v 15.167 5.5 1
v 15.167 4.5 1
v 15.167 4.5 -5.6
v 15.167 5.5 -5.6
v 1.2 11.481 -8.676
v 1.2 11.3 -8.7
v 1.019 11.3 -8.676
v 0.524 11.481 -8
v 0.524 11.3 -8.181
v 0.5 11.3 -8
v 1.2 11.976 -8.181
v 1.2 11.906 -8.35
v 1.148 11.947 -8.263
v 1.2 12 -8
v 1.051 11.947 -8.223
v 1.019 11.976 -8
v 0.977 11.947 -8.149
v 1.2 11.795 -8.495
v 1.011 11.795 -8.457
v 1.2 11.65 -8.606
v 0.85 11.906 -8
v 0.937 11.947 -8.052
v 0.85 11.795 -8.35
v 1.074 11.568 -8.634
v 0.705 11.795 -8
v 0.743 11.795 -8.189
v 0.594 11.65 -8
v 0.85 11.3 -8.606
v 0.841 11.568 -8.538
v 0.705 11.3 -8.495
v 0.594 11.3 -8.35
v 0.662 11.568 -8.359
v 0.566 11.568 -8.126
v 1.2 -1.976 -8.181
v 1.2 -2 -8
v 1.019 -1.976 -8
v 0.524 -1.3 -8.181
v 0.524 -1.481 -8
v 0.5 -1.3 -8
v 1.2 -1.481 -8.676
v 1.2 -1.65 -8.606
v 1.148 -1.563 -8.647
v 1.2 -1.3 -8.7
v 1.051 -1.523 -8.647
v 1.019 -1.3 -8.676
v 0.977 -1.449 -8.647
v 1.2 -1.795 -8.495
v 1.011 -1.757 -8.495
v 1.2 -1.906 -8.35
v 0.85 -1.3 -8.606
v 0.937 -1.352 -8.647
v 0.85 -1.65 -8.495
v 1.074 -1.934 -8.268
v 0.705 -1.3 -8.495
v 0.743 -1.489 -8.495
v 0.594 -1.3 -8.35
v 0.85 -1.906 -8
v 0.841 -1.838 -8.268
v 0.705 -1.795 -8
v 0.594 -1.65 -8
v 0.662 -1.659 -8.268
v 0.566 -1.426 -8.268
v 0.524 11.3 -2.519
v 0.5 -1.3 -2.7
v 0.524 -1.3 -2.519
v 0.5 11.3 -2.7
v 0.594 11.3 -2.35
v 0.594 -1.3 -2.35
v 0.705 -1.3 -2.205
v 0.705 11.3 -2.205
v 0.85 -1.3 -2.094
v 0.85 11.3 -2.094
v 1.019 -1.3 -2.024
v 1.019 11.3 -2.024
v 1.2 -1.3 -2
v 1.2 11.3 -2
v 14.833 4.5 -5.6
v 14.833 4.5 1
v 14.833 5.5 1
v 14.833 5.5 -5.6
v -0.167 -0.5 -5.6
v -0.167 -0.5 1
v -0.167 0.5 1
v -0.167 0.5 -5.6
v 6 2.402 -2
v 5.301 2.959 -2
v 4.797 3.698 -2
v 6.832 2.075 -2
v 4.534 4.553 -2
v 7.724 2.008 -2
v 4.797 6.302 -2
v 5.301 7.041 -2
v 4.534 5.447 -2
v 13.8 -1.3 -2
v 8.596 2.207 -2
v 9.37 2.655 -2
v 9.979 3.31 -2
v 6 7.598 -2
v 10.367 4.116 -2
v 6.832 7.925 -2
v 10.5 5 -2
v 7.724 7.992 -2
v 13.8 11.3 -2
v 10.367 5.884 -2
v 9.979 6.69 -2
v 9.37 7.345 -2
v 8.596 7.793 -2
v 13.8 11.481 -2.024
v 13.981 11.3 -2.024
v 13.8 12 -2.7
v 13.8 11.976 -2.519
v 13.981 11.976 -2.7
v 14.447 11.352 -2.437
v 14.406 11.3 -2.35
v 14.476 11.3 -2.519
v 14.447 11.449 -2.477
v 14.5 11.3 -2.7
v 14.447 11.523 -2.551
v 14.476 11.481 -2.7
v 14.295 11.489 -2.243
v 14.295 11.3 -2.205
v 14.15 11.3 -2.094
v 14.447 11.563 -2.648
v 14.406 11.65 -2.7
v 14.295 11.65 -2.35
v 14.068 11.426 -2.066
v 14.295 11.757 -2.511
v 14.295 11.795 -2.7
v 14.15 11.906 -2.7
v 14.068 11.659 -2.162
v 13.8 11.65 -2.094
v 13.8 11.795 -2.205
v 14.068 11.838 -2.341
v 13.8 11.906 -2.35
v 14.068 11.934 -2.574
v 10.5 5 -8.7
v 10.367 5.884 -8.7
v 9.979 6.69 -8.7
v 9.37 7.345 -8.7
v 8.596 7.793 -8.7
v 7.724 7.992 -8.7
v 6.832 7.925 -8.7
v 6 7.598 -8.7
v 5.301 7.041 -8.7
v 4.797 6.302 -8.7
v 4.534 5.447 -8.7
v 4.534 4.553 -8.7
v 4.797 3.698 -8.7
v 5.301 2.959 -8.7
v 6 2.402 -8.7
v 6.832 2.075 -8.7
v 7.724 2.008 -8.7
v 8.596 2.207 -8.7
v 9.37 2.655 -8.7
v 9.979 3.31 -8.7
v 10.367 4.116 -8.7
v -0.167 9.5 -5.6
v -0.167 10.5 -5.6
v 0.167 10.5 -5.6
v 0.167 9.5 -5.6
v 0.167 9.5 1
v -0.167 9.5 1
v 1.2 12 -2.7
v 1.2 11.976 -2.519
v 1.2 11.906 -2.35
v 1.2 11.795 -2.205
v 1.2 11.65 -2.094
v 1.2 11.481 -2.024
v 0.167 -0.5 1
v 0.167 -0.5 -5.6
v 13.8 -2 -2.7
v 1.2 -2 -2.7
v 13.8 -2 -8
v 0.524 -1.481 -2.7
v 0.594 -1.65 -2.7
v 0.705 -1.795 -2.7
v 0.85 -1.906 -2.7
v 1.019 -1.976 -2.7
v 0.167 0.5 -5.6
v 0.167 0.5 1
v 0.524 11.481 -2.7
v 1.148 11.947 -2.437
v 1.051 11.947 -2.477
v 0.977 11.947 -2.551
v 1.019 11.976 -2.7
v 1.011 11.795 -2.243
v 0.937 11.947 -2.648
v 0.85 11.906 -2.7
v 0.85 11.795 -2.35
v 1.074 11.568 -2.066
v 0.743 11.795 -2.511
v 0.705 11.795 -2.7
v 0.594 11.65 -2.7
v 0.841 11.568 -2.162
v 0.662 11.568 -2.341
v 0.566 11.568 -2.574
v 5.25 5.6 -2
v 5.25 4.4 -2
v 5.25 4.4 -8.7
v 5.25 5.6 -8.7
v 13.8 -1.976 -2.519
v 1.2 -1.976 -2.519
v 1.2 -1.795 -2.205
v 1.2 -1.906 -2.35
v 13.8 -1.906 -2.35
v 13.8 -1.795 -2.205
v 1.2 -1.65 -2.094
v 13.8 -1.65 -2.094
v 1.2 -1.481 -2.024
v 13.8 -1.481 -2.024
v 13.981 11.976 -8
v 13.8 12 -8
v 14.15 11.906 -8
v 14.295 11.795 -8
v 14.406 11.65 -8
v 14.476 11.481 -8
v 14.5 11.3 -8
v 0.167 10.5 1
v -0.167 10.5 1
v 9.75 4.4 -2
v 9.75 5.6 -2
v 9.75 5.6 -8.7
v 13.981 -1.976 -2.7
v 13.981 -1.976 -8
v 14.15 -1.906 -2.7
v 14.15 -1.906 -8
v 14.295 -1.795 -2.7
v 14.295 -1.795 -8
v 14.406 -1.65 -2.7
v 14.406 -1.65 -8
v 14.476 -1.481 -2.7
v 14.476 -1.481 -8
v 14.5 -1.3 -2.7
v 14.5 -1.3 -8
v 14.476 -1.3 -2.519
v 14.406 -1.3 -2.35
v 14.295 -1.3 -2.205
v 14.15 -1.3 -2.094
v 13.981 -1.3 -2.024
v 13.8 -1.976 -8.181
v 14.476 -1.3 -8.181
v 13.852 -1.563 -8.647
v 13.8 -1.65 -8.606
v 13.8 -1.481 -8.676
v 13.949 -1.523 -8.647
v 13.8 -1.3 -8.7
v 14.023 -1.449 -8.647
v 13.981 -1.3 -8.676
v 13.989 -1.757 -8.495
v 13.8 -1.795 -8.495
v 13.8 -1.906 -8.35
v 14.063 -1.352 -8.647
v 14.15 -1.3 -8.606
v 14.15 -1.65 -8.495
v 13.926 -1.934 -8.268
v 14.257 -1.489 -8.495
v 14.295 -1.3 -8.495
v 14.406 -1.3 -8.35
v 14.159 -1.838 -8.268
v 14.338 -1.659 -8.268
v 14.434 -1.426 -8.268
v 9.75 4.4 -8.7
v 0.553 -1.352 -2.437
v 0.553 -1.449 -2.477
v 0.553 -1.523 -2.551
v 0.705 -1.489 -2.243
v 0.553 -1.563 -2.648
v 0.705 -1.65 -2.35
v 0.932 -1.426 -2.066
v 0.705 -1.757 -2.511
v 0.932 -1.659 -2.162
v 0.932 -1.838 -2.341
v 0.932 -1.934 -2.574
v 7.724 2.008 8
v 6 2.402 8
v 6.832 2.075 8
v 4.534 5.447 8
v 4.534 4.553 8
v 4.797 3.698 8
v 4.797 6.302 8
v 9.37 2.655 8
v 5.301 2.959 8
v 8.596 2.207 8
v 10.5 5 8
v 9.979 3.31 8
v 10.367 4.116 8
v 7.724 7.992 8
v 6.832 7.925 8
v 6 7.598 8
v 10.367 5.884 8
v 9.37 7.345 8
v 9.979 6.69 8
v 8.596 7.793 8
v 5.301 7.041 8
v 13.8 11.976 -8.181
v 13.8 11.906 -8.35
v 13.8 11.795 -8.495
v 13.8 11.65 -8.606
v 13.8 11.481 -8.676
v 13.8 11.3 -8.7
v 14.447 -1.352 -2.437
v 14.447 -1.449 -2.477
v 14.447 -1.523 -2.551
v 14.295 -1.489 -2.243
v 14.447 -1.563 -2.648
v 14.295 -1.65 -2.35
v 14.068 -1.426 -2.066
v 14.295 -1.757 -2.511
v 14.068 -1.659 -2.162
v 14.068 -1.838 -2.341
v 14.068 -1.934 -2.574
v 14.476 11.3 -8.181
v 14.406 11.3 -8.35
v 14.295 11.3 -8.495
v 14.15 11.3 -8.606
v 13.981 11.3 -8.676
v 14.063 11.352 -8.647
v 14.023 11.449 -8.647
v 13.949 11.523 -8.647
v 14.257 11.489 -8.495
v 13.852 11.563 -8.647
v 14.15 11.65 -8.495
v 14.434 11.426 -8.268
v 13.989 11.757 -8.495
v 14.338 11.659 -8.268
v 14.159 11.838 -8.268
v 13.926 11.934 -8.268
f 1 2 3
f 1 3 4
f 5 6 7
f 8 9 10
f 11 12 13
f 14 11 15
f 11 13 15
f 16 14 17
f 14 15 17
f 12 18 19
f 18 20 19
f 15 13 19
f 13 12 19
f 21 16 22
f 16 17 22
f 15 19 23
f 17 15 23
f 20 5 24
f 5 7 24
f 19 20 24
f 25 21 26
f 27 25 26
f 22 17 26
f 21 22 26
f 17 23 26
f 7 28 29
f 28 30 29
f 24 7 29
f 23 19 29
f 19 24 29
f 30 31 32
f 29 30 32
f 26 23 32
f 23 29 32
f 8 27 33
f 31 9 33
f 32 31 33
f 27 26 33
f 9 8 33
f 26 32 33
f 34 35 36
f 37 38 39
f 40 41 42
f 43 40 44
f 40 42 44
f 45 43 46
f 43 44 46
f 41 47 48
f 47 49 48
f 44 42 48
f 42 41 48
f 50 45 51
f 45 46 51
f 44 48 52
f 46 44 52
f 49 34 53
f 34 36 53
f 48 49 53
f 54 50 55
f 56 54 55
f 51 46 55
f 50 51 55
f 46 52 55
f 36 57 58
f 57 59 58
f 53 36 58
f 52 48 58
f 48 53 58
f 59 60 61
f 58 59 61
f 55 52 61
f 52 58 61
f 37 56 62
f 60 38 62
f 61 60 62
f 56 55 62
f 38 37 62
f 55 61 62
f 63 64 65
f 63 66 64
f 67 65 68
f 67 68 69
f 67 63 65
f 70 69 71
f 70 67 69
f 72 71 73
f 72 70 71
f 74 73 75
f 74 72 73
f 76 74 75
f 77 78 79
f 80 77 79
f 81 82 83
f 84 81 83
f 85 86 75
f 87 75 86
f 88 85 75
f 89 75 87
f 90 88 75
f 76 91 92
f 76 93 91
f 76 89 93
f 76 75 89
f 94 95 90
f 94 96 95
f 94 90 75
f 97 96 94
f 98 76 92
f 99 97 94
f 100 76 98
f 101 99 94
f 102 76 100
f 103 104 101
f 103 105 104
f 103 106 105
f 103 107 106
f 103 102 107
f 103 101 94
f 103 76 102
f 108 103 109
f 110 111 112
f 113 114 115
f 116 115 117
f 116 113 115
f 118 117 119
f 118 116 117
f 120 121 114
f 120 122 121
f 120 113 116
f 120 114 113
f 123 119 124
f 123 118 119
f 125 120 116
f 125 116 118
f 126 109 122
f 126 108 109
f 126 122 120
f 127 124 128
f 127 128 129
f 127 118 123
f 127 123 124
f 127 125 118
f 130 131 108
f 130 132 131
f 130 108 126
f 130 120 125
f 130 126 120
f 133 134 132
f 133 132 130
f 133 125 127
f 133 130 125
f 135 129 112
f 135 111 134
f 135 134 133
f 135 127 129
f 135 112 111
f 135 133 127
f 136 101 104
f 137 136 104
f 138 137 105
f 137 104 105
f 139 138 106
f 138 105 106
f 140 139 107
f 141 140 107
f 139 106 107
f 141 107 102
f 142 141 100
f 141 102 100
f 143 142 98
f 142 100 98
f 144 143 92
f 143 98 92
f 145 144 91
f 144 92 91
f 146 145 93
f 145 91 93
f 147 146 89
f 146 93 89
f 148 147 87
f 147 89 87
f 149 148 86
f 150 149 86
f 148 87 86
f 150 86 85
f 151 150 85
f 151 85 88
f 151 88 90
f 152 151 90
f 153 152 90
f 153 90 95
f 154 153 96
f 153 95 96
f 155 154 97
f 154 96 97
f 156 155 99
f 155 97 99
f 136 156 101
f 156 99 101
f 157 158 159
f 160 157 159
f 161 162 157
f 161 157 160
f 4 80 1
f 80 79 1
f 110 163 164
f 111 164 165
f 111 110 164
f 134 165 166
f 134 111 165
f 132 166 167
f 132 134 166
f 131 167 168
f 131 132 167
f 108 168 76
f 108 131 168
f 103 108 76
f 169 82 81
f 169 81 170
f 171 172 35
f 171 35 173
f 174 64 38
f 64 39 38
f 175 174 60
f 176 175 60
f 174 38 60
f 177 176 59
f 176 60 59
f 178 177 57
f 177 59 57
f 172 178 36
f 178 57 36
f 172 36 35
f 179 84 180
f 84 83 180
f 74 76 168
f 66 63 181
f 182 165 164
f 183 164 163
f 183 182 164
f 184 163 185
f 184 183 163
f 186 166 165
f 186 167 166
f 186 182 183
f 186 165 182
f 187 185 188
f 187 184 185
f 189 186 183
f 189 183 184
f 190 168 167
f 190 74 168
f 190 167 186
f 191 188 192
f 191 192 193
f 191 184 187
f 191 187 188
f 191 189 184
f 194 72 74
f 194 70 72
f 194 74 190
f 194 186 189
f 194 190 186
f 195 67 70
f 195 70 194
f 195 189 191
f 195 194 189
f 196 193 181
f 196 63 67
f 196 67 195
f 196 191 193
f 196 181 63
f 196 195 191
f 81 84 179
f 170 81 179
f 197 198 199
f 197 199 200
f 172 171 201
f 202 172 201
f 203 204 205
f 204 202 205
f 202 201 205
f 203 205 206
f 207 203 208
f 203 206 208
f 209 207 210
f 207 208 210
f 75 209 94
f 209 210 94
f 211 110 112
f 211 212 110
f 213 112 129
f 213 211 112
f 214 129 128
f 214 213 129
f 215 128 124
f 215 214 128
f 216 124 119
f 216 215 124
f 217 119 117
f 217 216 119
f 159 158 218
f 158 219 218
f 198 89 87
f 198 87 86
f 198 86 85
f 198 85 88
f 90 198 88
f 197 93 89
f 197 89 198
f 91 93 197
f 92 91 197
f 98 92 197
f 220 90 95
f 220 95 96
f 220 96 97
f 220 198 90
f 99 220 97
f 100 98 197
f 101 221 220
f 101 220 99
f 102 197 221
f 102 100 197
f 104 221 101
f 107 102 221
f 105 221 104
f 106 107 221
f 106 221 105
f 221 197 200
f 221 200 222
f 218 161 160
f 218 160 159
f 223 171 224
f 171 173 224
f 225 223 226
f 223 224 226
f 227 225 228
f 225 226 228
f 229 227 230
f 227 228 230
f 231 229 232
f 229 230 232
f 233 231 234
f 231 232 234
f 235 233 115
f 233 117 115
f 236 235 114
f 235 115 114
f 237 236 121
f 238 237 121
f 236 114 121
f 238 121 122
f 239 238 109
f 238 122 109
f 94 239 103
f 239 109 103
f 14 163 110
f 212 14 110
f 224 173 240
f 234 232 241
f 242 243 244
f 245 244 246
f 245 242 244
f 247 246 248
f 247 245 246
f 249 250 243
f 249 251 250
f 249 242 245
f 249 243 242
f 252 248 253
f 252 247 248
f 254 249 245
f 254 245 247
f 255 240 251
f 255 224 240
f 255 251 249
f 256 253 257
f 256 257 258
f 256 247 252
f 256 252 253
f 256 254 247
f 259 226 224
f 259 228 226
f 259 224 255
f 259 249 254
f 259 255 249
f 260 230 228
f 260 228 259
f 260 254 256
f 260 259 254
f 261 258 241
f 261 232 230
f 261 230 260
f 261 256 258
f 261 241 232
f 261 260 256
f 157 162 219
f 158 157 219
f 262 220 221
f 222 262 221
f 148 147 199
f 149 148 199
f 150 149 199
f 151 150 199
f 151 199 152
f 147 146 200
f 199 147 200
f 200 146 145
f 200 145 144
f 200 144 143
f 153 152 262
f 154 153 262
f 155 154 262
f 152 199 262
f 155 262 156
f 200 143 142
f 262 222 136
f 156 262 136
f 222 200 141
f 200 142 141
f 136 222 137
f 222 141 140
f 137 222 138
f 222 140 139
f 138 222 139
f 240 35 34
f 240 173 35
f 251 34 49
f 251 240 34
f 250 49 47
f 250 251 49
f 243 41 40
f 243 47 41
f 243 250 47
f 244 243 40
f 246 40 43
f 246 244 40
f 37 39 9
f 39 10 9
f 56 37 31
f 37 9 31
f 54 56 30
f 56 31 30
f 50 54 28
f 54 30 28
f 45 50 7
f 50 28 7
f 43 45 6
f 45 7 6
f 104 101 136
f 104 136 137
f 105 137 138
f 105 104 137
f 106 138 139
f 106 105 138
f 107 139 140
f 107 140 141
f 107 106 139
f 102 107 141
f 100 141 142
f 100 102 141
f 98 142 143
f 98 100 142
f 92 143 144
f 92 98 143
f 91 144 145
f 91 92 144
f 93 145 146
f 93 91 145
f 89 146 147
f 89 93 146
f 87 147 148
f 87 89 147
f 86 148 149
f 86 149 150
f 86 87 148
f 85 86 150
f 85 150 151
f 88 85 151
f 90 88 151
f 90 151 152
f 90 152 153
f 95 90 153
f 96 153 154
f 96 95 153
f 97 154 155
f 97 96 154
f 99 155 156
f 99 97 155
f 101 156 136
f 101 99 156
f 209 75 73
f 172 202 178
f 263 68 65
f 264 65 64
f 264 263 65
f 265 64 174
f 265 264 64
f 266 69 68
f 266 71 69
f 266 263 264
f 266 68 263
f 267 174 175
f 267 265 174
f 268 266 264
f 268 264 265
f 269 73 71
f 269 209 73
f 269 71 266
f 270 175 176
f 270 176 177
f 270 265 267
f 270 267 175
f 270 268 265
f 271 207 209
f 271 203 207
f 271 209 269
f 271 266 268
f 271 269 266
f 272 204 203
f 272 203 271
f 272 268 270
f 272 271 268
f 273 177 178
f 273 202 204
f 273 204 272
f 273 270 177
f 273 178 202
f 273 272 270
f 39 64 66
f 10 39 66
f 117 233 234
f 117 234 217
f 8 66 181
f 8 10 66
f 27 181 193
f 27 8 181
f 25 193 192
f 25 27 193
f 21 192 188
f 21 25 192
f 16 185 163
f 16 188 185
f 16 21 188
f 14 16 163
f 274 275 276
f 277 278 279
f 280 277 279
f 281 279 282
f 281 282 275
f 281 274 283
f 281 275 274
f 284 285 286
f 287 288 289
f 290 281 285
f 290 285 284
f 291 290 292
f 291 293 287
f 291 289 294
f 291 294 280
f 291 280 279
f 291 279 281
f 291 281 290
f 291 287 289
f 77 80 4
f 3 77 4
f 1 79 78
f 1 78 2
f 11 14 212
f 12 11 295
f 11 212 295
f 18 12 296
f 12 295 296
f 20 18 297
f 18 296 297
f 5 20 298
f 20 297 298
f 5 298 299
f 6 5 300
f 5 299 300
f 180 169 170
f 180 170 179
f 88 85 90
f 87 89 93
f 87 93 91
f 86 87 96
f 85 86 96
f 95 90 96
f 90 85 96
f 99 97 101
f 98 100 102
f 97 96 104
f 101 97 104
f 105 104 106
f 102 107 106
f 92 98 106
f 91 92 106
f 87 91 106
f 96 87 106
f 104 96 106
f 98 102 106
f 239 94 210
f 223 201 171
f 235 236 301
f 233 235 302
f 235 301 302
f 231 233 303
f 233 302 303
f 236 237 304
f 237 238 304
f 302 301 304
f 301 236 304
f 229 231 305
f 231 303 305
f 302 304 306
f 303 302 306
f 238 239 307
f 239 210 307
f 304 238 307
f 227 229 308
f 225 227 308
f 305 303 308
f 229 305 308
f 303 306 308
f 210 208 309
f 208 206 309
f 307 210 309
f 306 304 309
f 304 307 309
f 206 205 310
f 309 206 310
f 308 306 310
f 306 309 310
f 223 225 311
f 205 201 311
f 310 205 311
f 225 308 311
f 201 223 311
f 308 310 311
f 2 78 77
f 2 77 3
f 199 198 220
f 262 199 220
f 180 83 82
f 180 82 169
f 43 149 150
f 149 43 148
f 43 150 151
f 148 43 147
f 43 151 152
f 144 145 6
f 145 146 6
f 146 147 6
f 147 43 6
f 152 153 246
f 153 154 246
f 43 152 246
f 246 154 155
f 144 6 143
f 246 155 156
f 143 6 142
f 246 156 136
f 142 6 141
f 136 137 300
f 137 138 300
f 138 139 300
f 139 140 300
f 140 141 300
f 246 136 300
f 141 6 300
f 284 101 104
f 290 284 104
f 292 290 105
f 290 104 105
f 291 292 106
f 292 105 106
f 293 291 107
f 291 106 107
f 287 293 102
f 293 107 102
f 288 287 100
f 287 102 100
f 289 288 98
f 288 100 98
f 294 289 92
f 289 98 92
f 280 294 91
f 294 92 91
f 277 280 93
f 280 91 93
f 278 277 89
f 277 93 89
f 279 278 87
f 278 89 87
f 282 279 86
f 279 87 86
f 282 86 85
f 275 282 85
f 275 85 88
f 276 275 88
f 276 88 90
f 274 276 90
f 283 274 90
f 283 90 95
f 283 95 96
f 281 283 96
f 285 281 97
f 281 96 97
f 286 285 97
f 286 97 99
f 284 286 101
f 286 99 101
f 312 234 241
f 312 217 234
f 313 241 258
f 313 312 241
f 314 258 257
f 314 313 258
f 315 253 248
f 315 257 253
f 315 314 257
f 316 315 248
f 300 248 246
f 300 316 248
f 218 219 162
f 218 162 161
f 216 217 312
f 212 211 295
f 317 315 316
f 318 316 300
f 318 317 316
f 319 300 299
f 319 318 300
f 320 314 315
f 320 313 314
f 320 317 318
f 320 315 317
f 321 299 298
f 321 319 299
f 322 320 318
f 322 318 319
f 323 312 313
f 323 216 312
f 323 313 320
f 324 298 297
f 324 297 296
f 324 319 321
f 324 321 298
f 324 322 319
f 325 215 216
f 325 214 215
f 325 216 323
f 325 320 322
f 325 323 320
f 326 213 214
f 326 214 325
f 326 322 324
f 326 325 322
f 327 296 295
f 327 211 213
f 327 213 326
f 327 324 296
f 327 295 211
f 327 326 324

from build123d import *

# Parameters (mm, degrees)
SKETCH003_W       = 0.333334
SKETCH003_H       = 1
PAD002_DEPTH      = 1
PAD002_DEPTH_BACK = 5.6
SKETCH004_R       = 3
SKETCH004_W       = 4.5
SKETCH004_H       = 1.2
PAD003_DEPTH      = 6.7
SKETCH006_R       = 3
PAD005_DEPTH      = 10
SKETCH_W          = 14
SKETCH_H          = 14
SKETCH_R          = 3
PAD_DEPTH         = 6.7
FILLET_R          = 0.7


with BuildPart() as pad002:
    # Sketch003 → Pad002 (new body, two sides)
    with BuildSketch(Plane(origin=(0, 10, 0), x_dir=(1, 0, 0), z_dir=(0, 0, 1))) as pad002_sk:
        Rectangle(SKETCH003_W, SKETCH003_H)
        with Locations((15, -5)):
            Rectangle(SKETCH003_W, SKETCH003_H)
        with Locations((0, -10)):
            Rectangle(SKETCH003_W, SKETCH003_H)
    extrude(amount=PAD002_DEPTH)
    extrude(pad002_sk.sketch, amount=-PAD002_DEPTH_BACK)


with BuildPart() as pad003:
    # Sketch004 → Pad003 (new body)
    with BuildSketch(Plane(origin=(0, 10, -2), x_dir=(1, 0, 0), z_dir=(0, 0, 1))):
        with Locations((7.5, -5)):
            Circle(SKETCH004_R)
        with Locations((7.5, -5)):
            Rectangle(SKETCH004_W, SKETCH004_H, mode=Mode.SUBTRACT)
    extrude(amount=-PAD003_DEPTH)


with BuildPart() as pad005:
    # Sketch006 → Pad005 (new body)
    with BuildSketch(Plane(origin=(0, 10, -2), x_dir=(1, 0, 0), z_dir=(0, 0, 1))):
        with Locations((7.5, -5)):
            Circle(SKETCH006_R)
    extrude(amount=PAD005_DEPTH)


with BuildPart() as fillet_body:
    # Sketch → Pad (new body)
    with BuildSketch(Plane(origin=(0, 10, -2), x_dir=(1, 0, 0), z_dir=(0, 0, 1))):
        with Locations((7.5, -5)):
            Rectangle(SKETCH_W, SKETCH_H)
        with Locations((7.5, -5)):
            Circle(SKETCH_R, mode=Mode.SUBTRACT)
    extrude(amount=-PAD_DEPTH)

    # Fillet
    fillet_edges = [fillet_body.edges().sort_by_distance(p)[0] for p in [
        (7.5, -2, -2),
        (0.5, 5, -2),
        (7.5, 12, -2),
        (14.5, 5, -2),
        (14.5, 12, -5.35),
        (14.5, -2, -5.35),
        (0.5, -2, -5.35),
        (7.5, -2, -8.7),
        (14.5, 5, -8.7),
        (0.5, 5, -8.7),
        (7.5, 12, -8.7),
        (0.5, 12, -5.35),
    ]]
    fillet(fillet_edges, radius=FILLET_R)


solid = Compound([pad002.part, pad003.part, pad005.part, fillet_body.part])
